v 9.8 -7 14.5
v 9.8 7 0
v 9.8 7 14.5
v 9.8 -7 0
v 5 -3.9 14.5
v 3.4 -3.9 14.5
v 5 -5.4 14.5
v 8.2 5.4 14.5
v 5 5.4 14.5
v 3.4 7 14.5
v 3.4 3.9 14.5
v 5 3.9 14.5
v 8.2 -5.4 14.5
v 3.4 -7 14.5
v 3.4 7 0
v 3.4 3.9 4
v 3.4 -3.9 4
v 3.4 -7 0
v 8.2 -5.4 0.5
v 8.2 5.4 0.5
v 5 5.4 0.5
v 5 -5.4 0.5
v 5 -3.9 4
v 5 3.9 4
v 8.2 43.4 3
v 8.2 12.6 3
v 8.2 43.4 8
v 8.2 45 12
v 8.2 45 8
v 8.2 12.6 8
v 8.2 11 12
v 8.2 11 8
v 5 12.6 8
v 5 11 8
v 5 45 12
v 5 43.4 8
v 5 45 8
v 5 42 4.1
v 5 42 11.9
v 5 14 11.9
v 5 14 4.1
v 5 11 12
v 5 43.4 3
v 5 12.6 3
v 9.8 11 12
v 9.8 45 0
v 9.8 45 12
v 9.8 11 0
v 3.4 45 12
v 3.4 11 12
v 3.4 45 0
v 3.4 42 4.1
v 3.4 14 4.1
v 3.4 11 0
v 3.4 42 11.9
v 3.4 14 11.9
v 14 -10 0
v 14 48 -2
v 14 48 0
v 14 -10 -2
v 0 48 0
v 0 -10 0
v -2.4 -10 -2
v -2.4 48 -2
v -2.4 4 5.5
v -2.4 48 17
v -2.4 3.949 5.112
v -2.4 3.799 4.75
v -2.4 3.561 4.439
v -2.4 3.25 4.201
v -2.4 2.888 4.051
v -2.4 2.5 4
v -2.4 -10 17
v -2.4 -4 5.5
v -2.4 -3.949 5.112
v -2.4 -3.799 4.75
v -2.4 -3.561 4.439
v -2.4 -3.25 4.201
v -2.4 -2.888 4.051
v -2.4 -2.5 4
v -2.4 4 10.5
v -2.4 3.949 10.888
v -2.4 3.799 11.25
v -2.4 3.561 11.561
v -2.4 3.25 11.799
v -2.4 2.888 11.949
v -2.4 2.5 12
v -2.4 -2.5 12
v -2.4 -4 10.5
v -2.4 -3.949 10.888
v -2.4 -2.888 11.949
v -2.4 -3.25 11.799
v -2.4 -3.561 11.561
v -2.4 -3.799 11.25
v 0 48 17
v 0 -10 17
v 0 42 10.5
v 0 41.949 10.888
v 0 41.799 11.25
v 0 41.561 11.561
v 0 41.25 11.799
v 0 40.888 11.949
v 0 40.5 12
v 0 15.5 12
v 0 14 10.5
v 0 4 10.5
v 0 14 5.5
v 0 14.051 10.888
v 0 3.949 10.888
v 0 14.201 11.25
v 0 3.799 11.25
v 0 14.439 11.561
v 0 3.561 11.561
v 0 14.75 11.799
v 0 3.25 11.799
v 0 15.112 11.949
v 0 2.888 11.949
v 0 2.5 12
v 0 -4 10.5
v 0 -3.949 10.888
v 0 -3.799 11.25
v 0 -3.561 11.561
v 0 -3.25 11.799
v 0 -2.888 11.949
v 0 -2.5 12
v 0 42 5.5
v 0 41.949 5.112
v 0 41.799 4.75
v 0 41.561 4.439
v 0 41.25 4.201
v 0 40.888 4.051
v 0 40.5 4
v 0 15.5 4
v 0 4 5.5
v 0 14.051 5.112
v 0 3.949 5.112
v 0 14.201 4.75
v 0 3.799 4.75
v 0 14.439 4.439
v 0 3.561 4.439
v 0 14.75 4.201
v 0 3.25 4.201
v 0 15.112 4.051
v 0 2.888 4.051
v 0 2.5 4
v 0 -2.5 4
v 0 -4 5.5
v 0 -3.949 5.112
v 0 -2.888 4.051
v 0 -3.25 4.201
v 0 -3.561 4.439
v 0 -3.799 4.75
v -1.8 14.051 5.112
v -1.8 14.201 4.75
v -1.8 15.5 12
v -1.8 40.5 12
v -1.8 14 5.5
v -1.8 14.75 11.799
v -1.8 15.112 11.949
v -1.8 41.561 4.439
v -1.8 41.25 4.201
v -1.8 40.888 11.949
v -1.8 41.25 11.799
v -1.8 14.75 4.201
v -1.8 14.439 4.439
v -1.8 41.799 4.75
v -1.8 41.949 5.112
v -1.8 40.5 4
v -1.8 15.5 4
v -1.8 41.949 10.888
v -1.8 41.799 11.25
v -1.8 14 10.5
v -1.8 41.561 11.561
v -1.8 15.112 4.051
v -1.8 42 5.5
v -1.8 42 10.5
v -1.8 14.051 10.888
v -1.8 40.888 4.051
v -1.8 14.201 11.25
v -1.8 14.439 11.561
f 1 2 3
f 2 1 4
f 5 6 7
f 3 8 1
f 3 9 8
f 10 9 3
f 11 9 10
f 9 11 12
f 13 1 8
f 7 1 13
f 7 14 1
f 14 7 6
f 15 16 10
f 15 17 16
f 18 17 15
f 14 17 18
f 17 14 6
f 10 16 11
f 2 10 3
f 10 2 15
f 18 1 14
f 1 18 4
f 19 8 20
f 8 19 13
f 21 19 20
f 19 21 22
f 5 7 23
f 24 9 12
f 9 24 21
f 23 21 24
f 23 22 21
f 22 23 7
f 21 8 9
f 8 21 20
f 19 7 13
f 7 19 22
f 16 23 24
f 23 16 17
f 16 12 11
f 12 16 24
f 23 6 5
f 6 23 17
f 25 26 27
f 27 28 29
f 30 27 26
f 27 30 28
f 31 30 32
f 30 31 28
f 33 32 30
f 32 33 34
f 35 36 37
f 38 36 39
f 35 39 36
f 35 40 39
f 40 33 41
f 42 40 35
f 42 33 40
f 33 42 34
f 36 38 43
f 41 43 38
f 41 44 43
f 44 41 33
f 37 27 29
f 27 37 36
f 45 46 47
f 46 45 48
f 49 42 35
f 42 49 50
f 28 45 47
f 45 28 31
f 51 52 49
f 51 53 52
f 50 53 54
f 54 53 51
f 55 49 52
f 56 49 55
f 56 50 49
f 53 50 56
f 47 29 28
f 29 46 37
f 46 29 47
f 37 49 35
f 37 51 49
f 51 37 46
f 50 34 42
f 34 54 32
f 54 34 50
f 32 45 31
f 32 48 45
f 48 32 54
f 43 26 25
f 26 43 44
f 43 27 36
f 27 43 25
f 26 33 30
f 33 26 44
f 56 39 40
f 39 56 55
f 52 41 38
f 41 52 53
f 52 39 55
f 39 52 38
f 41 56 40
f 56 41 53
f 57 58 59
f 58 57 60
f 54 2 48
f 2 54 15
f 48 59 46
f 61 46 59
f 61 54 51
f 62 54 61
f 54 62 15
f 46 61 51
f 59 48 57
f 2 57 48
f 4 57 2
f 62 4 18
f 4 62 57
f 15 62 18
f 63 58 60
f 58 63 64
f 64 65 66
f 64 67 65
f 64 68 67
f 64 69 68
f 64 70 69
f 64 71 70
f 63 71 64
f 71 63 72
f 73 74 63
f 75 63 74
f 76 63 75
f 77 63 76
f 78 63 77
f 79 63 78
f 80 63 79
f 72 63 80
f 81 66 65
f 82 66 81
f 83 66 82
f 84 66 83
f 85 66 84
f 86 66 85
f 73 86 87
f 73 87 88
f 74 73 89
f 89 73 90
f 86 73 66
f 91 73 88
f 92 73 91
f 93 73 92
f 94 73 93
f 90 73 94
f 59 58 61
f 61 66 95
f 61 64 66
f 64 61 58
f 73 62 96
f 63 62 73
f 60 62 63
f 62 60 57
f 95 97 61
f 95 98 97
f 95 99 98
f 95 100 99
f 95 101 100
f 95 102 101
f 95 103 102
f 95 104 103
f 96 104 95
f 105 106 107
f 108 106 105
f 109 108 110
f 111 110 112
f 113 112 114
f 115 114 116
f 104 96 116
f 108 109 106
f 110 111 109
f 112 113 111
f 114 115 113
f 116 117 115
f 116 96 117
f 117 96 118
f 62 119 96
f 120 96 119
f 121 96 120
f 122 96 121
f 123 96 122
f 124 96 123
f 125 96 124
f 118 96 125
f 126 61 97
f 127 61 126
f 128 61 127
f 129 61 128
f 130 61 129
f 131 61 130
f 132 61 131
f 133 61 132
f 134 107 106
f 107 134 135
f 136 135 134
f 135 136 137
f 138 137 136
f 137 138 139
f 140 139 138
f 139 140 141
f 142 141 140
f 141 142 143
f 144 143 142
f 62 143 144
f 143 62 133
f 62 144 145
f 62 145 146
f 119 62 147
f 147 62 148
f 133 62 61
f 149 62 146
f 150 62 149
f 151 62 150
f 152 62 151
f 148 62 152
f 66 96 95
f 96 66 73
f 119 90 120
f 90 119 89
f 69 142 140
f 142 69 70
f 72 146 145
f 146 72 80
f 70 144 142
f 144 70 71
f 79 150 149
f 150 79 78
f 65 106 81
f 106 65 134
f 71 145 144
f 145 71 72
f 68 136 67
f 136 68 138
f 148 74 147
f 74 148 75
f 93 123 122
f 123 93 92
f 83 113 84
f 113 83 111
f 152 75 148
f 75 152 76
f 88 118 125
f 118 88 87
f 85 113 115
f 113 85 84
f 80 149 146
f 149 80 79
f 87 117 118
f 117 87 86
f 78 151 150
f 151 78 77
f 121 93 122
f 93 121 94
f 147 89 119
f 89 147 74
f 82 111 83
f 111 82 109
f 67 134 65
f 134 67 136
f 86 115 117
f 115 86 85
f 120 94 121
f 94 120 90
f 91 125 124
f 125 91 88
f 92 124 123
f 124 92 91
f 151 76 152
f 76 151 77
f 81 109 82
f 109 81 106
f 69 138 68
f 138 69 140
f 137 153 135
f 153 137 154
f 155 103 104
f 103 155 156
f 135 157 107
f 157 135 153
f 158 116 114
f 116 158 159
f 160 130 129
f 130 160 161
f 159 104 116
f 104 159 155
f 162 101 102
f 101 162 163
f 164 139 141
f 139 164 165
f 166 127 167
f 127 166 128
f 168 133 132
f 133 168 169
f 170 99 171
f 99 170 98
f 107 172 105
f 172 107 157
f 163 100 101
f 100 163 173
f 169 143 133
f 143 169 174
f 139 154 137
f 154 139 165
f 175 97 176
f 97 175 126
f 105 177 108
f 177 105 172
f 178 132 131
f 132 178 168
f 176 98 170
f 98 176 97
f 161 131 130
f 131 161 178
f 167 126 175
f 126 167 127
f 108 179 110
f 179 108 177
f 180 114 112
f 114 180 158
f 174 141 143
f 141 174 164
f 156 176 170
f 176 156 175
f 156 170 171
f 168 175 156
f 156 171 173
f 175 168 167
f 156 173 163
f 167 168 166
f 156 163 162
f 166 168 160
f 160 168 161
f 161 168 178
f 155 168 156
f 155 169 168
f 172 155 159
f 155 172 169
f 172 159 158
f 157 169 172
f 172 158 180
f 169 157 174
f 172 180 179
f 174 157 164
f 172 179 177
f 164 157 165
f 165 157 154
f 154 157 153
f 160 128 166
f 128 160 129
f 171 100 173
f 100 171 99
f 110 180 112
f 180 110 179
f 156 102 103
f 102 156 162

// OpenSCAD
// Holders on a short piece of wall and floor, for the catalogue: a single
// pixel standing up (open window), and three in a row lying along the wall
// behind a diffuser skin.
use <../neopixel-strip.scad>

wall  = 2.4;
axisZ = 8;
rowY  = 18;          // the row's first LED

difference()
{
  union()
  {
    translate([-wall, -10, -2]) cube([wall + 14, 10 + rowY + 2*10 + 10, 2]);
    translate([-wall, -10, 0]) cube([wall, 10 + rowY + 2*10 + 10, axisZ + 9]);
    npxHolder(axisZ, length = 15);
    translate([0, rowY, 0]) npxHolder(axisZ, n = 3, along = true);
  }
  npxWallCut(axisZ, wall);
  translate([0, rowY, 0]) npxWallCut(axisZ, wall, n = 3, along = true, window = "skin", bar = true);
}
